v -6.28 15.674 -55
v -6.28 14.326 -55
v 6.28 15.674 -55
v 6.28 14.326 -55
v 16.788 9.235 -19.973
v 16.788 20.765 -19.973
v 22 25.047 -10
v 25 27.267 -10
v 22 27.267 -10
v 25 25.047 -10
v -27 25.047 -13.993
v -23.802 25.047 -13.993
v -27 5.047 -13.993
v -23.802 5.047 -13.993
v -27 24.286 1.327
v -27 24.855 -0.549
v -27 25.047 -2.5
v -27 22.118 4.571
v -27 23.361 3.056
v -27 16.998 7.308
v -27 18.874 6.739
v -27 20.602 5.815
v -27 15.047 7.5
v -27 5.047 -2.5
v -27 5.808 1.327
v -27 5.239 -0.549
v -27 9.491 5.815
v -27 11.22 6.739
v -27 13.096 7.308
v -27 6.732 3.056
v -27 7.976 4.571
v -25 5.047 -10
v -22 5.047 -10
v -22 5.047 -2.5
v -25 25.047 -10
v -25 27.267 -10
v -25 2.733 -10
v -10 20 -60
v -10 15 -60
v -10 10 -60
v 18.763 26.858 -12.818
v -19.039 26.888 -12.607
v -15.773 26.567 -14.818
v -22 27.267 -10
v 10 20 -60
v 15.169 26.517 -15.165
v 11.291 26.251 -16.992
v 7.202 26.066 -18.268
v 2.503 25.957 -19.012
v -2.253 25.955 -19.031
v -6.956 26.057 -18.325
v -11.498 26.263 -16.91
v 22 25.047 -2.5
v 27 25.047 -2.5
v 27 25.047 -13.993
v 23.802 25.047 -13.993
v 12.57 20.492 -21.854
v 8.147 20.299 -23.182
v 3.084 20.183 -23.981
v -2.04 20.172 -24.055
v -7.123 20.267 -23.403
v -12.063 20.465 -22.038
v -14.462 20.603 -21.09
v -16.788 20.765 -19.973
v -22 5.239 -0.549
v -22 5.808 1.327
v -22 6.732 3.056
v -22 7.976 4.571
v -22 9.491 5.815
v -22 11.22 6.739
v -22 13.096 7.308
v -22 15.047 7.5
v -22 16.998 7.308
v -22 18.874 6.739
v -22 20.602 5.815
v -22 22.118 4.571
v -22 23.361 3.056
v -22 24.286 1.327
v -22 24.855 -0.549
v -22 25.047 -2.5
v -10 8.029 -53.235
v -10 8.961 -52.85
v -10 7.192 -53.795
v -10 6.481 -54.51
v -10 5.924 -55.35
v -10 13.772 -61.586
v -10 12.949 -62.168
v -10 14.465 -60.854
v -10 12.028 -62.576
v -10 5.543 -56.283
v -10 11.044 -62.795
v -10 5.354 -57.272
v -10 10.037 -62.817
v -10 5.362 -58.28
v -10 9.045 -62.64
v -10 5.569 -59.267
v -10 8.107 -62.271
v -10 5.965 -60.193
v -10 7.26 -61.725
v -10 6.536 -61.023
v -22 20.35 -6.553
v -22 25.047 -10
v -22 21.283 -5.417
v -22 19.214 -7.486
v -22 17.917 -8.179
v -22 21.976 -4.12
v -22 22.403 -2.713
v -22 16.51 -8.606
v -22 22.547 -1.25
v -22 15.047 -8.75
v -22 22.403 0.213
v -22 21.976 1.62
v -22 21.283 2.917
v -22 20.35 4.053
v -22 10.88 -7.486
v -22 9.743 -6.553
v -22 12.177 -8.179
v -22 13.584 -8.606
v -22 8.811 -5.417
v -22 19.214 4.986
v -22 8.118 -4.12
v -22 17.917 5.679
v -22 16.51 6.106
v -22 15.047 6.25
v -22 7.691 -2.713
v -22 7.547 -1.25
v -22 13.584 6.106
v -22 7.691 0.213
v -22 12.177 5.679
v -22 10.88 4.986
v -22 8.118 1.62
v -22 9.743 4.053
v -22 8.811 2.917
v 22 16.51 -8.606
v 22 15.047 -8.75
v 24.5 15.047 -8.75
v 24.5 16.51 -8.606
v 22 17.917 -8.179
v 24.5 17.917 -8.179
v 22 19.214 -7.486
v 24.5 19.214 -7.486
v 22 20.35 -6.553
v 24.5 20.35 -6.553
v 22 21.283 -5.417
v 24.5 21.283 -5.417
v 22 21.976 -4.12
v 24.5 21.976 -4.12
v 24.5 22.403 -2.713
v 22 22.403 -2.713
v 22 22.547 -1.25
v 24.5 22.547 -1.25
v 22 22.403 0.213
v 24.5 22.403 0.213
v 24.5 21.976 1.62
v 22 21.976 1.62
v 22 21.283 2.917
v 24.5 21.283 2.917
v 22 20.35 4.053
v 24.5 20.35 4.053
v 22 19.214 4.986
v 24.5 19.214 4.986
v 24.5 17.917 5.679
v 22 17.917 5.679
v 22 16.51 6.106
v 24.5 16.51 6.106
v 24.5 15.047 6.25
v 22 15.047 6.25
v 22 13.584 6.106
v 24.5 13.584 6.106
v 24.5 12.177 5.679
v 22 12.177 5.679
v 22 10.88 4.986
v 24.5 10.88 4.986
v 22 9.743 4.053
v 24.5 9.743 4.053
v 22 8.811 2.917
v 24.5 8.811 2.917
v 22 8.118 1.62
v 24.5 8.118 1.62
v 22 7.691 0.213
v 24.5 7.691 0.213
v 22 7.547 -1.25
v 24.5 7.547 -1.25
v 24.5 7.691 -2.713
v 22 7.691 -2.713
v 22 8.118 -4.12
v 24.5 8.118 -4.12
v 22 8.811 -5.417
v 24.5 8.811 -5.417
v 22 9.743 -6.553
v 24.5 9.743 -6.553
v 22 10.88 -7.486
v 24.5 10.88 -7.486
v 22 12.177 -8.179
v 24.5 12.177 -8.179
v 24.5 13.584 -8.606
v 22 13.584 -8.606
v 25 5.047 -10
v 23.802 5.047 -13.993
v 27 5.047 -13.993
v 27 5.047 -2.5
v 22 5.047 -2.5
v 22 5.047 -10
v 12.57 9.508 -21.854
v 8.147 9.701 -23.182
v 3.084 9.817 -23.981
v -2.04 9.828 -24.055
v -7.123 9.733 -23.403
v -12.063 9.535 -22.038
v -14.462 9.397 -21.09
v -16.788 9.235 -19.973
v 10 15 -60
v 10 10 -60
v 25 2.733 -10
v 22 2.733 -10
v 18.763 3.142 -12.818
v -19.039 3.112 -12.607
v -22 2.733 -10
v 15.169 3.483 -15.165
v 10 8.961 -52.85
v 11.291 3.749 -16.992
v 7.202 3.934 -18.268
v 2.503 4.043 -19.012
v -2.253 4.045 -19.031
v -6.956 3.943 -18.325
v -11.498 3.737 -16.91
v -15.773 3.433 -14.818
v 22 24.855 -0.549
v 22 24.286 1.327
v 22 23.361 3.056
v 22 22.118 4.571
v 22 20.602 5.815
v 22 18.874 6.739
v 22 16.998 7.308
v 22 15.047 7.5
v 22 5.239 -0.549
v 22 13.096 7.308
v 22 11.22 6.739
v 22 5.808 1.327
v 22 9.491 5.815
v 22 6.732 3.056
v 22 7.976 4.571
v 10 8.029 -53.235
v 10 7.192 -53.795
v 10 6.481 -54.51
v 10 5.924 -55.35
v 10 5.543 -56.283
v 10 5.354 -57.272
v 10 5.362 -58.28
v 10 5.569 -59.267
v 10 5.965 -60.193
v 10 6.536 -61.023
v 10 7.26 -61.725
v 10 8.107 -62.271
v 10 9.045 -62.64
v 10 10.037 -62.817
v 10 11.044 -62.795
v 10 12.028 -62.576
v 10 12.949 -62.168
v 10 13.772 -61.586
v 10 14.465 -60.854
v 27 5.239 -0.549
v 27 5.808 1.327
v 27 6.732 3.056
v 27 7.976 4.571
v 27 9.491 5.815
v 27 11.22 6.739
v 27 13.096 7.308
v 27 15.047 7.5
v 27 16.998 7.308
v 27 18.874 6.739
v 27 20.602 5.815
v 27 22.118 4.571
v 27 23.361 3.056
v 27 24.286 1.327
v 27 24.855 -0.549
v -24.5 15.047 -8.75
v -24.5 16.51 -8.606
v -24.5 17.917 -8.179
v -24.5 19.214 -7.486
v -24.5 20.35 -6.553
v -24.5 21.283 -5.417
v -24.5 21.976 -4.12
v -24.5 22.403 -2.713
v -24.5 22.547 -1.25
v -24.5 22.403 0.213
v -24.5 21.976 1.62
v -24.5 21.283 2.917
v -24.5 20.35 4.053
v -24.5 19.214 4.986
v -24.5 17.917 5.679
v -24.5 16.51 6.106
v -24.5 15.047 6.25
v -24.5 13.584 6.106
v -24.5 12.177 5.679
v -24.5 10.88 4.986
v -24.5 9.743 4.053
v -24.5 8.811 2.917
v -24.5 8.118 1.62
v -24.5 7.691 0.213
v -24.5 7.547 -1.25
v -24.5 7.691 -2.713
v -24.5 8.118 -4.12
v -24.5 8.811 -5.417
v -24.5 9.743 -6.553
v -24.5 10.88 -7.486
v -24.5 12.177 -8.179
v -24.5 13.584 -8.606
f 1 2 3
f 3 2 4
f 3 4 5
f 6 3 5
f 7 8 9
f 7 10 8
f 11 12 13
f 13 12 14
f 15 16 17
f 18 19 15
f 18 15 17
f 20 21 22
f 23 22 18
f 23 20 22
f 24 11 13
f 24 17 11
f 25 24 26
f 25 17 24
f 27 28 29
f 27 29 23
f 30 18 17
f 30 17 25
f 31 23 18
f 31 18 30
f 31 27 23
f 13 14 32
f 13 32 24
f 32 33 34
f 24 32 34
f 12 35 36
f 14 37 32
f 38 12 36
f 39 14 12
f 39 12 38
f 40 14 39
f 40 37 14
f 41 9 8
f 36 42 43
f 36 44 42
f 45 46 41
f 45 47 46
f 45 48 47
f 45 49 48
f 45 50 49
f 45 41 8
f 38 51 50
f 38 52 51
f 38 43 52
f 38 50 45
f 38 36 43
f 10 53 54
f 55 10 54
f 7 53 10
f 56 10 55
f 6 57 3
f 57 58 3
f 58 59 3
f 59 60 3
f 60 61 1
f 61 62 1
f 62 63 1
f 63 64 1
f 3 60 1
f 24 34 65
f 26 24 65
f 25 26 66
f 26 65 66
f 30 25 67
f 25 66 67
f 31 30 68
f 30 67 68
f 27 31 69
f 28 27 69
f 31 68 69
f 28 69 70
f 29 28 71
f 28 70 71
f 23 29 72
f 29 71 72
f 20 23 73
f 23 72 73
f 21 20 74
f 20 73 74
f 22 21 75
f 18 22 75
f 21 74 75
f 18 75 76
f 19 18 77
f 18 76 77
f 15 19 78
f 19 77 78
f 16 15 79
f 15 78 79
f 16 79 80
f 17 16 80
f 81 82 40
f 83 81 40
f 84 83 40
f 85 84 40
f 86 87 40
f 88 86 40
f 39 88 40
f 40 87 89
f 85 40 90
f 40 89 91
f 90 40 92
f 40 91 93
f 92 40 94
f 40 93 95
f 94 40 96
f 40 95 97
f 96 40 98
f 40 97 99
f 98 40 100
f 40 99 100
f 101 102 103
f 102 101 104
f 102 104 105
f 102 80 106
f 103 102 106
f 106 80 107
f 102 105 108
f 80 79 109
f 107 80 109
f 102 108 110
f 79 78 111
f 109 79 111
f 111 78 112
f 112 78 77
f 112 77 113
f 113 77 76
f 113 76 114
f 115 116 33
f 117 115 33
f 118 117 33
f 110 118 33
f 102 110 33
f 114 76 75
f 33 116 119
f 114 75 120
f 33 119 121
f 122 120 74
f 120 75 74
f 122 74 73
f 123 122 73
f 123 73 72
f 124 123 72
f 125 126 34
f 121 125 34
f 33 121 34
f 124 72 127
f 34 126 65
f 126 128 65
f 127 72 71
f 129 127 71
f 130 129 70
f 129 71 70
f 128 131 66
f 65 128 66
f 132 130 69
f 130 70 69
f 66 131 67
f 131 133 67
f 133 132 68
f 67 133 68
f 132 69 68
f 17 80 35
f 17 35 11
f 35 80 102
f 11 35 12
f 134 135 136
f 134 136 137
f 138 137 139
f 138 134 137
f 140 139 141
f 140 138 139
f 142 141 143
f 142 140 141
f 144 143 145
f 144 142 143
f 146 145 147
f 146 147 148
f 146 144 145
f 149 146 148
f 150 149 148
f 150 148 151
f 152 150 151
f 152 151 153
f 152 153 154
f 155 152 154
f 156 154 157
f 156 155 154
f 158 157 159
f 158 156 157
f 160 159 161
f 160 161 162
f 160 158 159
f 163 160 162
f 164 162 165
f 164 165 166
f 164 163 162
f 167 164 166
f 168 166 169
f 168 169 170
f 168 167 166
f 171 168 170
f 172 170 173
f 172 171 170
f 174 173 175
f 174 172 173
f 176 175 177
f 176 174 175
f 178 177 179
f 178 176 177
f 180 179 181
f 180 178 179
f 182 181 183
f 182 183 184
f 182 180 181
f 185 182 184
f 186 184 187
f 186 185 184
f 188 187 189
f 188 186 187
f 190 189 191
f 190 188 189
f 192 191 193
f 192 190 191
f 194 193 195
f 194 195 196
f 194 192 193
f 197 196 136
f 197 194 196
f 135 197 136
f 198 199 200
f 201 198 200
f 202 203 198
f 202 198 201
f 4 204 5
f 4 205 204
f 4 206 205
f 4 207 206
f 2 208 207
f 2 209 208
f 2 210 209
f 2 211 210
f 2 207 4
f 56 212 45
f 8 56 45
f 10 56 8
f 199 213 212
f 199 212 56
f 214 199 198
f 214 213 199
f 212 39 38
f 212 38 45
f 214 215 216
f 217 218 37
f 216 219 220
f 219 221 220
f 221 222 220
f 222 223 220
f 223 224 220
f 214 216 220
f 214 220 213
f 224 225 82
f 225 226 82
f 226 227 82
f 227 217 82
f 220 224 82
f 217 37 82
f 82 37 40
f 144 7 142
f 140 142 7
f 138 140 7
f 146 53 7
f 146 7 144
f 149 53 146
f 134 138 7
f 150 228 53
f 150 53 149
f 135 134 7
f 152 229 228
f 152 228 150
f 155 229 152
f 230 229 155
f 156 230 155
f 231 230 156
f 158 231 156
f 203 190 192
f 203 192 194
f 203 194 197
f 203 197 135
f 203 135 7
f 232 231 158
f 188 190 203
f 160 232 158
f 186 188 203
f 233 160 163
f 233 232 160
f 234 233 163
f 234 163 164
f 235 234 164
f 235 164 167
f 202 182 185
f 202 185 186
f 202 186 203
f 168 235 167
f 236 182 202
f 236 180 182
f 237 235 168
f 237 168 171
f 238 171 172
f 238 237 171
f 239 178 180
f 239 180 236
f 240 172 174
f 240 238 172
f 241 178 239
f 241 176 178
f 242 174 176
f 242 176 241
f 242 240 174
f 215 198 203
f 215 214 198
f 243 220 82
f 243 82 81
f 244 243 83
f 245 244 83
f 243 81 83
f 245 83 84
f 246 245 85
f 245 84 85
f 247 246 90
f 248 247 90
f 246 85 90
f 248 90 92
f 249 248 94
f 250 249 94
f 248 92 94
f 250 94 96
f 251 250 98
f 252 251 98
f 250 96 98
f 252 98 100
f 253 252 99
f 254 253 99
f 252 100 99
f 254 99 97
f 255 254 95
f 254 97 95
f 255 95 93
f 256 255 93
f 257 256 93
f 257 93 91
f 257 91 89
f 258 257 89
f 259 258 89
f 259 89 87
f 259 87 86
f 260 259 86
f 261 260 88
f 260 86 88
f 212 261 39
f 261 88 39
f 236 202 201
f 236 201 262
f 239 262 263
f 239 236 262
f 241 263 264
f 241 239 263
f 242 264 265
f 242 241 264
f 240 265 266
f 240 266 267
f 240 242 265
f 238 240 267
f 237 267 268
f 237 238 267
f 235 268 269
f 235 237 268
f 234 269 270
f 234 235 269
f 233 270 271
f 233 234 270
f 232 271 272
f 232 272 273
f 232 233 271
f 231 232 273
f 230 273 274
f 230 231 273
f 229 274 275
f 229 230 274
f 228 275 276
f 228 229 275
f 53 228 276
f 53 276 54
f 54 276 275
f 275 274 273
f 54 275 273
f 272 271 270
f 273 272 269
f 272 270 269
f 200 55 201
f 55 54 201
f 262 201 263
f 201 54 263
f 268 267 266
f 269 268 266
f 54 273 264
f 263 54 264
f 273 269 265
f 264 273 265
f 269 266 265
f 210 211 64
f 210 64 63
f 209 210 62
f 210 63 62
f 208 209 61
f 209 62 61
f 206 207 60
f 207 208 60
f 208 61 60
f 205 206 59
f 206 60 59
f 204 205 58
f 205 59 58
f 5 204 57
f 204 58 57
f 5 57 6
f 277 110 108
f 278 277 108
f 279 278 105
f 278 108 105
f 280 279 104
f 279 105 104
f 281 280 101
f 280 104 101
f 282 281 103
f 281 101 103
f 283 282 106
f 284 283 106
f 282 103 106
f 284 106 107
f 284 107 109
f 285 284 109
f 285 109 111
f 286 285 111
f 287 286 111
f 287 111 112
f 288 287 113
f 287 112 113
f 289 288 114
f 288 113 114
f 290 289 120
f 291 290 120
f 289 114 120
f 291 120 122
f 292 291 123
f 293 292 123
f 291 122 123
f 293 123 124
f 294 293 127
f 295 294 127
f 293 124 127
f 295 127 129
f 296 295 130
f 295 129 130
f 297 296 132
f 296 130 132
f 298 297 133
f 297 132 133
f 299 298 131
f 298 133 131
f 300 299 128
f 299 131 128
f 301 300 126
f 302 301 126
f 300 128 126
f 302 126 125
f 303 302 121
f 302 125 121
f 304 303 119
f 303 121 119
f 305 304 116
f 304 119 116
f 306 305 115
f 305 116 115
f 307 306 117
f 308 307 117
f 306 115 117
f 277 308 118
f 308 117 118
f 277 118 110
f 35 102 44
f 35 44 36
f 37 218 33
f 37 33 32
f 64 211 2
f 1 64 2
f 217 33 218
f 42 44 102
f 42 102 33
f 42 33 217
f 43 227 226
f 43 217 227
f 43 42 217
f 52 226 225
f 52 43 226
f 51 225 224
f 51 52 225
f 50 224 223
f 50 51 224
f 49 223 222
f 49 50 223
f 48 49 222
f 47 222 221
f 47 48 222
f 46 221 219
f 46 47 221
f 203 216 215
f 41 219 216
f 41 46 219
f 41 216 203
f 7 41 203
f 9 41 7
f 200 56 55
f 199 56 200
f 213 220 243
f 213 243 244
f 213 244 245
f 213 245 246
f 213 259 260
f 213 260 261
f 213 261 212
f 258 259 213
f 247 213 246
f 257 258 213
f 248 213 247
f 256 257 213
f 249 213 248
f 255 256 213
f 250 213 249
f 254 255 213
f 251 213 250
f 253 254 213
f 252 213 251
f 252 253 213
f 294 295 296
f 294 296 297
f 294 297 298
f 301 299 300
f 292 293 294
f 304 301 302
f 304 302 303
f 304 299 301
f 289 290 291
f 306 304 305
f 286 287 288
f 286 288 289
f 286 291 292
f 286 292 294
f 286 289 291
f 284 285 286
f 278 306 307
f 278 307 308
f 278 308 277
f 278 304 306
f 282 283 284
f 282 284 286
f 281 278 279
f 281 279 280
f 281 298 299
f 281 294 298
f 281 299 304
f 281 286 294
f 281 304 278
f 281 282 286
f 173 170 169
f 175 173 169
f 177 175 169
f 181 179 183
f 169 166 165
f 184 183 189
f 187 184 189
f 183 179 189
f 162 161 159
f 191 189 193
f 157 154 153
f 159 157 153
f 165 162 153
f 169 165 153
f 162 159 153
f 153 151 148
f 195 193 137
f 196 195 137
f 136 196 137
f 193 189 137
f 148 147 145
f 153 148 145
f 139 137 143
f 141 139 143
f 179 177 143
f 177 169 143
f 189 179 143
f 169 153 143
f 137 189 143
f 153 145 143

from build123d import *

# Parameters (mm, degrees)
BOSS_EXTRUDE1_DEPTH = 30
CUT_EXTRUDE2_DEPTH  = 50
CUT_EXTRUDE6_DEPTH  = 27
SHELL3_T            = 5
BOSS_EXTRUDE3_DEPTH = 20
BOSS_EXTRUDE4_START = -3
BOSS_EXTRUDE4_DEPTH = 5
SKETCH7_R           = 7.5
CUT_EXTRUDE3_DEPTH  = 2.5


with BuildPart() as part:
    # Sketch1 → Boss-Extrude1 (new body)
    with BuildSketch(Plane(origin=(0, 0, 0), x_dir=(1, 0, 0), z_dir=(0, 1, 0))):
        Polygon((-10, 60), (10, 60), (25, 10), (-25, 10), align=None)
    extrude(amount=BOSS_EXTRUDE1_DEPTH)

    # Sketch3 → Cut-Extrude2 (cut)
    with BuildSketch(Plane(origin=(-25, 0, 0), x_dir=(0, -1, 0), z_dir=(-1, 0, 0))):
        Polygon((-30, -10), (-27.26731497, -10), (-20, -60), (-30, -60), align=None)
        Polygon((0, -60), (0, -10), (-2.73268503, -10), (-10, -60), align=None)
    extrude(amount=-CUT_EXTRUDE2_DEPTH, mode=Mode.SUBTRACT)

    # Sketch10 → Cut-Extrude6 (cut)
    with BuildSketch(Plane(origin=(0, 27.26731497, 0), x_dir=(-1, 0, 0), z_dir=(0, 1, 0))):
        with BuildLine():
            Line((-22, -10), (22, -10))
            ThreePointArc((22, -10), (0, -19.112698372), (-22, -10))
        make_face()
    extrude(amount=-CUT_EXTRUDE6_DEPTH, mode=Mode.SUBTRACT)

    # Shell3 (no face opened: a closed hollow body)
    add(offset(amount=-SHELL3_T, mode=Mode.PRIVATE), mode=Mode.SUBTRACT)

    # Sketch5 → Boss-Extrude3 (add)
    with BuildSketch(Plane(origin=(-10, 0, 0), x_dir=(0, -1, 0), z_dir=(1, 0, 0))):
        with BuildLine():
            Line((-10, 60), (-8.960811725, 52.850259833))
            ThreePointArc((-8.960811725, 52.850259833), (-6.536467075, 61.023474826), (-15, 60))
            Line((-15, 60), (-10, 60))
        make_face()
    extrude(amount=BOSS_EXTRUDE3_DEPTH)

    # Sketch6 → Boss-Extrude4 (add)
    with BuildSketch(Plane(origin=(-25, 0, 0), x_dir=(0, -1, 0), z_dir=(-1, 0, 0)).offset(BOSS_EXTRUDE4_START)):
        with BuildLine():
            Line((-25.046773104, -9.993090655), (-25.046773104, -13.993090655))
            Line((-25.046773104, -13.993090655), (-5.046773104, -13.993090655))
            Line((-5.046773104, -13.993090655), (-5.046773104, -9.993090655))
            Line((-5.046773104, -9.993090655), (-5.046773104, -2.5))
            ThreePointArc((-5.046773104, -2.5), (-15.046773104, 7.5), (-25.046773104, -2.5))
            Line((-25.046773104, -2.5), (-25.046773104, -9.993090655))
        make_face()
    boss_extrude4 = extrude(amount=BOSS_EXTRUDE4_DEPTH)

    # Sketch7 → Cut-Extrude3 (cut)
    with BuildSketch(Plane(origin=(-22, 0, 0), x_dir=(0, 0, -1), z_dir=(1, 0, 0))):
        with Locations((1.25, 15.046773104)):
            Circle(SKETCH7_R)
    cut_extrude3 = extrude(amount=-CUT_EXTRUDE3_DEPTH, mode=Mode.SUBTRACT)

    # Mirror2: Boss-Extrude4, Cut-Extrude3 across plane
    add(boss_extrude4.mirror(Plane.ZY))
    add(cut_extrude3.mirror(Plane.ZY), mode=Mode.SUBTRACT)


solid = part.part
